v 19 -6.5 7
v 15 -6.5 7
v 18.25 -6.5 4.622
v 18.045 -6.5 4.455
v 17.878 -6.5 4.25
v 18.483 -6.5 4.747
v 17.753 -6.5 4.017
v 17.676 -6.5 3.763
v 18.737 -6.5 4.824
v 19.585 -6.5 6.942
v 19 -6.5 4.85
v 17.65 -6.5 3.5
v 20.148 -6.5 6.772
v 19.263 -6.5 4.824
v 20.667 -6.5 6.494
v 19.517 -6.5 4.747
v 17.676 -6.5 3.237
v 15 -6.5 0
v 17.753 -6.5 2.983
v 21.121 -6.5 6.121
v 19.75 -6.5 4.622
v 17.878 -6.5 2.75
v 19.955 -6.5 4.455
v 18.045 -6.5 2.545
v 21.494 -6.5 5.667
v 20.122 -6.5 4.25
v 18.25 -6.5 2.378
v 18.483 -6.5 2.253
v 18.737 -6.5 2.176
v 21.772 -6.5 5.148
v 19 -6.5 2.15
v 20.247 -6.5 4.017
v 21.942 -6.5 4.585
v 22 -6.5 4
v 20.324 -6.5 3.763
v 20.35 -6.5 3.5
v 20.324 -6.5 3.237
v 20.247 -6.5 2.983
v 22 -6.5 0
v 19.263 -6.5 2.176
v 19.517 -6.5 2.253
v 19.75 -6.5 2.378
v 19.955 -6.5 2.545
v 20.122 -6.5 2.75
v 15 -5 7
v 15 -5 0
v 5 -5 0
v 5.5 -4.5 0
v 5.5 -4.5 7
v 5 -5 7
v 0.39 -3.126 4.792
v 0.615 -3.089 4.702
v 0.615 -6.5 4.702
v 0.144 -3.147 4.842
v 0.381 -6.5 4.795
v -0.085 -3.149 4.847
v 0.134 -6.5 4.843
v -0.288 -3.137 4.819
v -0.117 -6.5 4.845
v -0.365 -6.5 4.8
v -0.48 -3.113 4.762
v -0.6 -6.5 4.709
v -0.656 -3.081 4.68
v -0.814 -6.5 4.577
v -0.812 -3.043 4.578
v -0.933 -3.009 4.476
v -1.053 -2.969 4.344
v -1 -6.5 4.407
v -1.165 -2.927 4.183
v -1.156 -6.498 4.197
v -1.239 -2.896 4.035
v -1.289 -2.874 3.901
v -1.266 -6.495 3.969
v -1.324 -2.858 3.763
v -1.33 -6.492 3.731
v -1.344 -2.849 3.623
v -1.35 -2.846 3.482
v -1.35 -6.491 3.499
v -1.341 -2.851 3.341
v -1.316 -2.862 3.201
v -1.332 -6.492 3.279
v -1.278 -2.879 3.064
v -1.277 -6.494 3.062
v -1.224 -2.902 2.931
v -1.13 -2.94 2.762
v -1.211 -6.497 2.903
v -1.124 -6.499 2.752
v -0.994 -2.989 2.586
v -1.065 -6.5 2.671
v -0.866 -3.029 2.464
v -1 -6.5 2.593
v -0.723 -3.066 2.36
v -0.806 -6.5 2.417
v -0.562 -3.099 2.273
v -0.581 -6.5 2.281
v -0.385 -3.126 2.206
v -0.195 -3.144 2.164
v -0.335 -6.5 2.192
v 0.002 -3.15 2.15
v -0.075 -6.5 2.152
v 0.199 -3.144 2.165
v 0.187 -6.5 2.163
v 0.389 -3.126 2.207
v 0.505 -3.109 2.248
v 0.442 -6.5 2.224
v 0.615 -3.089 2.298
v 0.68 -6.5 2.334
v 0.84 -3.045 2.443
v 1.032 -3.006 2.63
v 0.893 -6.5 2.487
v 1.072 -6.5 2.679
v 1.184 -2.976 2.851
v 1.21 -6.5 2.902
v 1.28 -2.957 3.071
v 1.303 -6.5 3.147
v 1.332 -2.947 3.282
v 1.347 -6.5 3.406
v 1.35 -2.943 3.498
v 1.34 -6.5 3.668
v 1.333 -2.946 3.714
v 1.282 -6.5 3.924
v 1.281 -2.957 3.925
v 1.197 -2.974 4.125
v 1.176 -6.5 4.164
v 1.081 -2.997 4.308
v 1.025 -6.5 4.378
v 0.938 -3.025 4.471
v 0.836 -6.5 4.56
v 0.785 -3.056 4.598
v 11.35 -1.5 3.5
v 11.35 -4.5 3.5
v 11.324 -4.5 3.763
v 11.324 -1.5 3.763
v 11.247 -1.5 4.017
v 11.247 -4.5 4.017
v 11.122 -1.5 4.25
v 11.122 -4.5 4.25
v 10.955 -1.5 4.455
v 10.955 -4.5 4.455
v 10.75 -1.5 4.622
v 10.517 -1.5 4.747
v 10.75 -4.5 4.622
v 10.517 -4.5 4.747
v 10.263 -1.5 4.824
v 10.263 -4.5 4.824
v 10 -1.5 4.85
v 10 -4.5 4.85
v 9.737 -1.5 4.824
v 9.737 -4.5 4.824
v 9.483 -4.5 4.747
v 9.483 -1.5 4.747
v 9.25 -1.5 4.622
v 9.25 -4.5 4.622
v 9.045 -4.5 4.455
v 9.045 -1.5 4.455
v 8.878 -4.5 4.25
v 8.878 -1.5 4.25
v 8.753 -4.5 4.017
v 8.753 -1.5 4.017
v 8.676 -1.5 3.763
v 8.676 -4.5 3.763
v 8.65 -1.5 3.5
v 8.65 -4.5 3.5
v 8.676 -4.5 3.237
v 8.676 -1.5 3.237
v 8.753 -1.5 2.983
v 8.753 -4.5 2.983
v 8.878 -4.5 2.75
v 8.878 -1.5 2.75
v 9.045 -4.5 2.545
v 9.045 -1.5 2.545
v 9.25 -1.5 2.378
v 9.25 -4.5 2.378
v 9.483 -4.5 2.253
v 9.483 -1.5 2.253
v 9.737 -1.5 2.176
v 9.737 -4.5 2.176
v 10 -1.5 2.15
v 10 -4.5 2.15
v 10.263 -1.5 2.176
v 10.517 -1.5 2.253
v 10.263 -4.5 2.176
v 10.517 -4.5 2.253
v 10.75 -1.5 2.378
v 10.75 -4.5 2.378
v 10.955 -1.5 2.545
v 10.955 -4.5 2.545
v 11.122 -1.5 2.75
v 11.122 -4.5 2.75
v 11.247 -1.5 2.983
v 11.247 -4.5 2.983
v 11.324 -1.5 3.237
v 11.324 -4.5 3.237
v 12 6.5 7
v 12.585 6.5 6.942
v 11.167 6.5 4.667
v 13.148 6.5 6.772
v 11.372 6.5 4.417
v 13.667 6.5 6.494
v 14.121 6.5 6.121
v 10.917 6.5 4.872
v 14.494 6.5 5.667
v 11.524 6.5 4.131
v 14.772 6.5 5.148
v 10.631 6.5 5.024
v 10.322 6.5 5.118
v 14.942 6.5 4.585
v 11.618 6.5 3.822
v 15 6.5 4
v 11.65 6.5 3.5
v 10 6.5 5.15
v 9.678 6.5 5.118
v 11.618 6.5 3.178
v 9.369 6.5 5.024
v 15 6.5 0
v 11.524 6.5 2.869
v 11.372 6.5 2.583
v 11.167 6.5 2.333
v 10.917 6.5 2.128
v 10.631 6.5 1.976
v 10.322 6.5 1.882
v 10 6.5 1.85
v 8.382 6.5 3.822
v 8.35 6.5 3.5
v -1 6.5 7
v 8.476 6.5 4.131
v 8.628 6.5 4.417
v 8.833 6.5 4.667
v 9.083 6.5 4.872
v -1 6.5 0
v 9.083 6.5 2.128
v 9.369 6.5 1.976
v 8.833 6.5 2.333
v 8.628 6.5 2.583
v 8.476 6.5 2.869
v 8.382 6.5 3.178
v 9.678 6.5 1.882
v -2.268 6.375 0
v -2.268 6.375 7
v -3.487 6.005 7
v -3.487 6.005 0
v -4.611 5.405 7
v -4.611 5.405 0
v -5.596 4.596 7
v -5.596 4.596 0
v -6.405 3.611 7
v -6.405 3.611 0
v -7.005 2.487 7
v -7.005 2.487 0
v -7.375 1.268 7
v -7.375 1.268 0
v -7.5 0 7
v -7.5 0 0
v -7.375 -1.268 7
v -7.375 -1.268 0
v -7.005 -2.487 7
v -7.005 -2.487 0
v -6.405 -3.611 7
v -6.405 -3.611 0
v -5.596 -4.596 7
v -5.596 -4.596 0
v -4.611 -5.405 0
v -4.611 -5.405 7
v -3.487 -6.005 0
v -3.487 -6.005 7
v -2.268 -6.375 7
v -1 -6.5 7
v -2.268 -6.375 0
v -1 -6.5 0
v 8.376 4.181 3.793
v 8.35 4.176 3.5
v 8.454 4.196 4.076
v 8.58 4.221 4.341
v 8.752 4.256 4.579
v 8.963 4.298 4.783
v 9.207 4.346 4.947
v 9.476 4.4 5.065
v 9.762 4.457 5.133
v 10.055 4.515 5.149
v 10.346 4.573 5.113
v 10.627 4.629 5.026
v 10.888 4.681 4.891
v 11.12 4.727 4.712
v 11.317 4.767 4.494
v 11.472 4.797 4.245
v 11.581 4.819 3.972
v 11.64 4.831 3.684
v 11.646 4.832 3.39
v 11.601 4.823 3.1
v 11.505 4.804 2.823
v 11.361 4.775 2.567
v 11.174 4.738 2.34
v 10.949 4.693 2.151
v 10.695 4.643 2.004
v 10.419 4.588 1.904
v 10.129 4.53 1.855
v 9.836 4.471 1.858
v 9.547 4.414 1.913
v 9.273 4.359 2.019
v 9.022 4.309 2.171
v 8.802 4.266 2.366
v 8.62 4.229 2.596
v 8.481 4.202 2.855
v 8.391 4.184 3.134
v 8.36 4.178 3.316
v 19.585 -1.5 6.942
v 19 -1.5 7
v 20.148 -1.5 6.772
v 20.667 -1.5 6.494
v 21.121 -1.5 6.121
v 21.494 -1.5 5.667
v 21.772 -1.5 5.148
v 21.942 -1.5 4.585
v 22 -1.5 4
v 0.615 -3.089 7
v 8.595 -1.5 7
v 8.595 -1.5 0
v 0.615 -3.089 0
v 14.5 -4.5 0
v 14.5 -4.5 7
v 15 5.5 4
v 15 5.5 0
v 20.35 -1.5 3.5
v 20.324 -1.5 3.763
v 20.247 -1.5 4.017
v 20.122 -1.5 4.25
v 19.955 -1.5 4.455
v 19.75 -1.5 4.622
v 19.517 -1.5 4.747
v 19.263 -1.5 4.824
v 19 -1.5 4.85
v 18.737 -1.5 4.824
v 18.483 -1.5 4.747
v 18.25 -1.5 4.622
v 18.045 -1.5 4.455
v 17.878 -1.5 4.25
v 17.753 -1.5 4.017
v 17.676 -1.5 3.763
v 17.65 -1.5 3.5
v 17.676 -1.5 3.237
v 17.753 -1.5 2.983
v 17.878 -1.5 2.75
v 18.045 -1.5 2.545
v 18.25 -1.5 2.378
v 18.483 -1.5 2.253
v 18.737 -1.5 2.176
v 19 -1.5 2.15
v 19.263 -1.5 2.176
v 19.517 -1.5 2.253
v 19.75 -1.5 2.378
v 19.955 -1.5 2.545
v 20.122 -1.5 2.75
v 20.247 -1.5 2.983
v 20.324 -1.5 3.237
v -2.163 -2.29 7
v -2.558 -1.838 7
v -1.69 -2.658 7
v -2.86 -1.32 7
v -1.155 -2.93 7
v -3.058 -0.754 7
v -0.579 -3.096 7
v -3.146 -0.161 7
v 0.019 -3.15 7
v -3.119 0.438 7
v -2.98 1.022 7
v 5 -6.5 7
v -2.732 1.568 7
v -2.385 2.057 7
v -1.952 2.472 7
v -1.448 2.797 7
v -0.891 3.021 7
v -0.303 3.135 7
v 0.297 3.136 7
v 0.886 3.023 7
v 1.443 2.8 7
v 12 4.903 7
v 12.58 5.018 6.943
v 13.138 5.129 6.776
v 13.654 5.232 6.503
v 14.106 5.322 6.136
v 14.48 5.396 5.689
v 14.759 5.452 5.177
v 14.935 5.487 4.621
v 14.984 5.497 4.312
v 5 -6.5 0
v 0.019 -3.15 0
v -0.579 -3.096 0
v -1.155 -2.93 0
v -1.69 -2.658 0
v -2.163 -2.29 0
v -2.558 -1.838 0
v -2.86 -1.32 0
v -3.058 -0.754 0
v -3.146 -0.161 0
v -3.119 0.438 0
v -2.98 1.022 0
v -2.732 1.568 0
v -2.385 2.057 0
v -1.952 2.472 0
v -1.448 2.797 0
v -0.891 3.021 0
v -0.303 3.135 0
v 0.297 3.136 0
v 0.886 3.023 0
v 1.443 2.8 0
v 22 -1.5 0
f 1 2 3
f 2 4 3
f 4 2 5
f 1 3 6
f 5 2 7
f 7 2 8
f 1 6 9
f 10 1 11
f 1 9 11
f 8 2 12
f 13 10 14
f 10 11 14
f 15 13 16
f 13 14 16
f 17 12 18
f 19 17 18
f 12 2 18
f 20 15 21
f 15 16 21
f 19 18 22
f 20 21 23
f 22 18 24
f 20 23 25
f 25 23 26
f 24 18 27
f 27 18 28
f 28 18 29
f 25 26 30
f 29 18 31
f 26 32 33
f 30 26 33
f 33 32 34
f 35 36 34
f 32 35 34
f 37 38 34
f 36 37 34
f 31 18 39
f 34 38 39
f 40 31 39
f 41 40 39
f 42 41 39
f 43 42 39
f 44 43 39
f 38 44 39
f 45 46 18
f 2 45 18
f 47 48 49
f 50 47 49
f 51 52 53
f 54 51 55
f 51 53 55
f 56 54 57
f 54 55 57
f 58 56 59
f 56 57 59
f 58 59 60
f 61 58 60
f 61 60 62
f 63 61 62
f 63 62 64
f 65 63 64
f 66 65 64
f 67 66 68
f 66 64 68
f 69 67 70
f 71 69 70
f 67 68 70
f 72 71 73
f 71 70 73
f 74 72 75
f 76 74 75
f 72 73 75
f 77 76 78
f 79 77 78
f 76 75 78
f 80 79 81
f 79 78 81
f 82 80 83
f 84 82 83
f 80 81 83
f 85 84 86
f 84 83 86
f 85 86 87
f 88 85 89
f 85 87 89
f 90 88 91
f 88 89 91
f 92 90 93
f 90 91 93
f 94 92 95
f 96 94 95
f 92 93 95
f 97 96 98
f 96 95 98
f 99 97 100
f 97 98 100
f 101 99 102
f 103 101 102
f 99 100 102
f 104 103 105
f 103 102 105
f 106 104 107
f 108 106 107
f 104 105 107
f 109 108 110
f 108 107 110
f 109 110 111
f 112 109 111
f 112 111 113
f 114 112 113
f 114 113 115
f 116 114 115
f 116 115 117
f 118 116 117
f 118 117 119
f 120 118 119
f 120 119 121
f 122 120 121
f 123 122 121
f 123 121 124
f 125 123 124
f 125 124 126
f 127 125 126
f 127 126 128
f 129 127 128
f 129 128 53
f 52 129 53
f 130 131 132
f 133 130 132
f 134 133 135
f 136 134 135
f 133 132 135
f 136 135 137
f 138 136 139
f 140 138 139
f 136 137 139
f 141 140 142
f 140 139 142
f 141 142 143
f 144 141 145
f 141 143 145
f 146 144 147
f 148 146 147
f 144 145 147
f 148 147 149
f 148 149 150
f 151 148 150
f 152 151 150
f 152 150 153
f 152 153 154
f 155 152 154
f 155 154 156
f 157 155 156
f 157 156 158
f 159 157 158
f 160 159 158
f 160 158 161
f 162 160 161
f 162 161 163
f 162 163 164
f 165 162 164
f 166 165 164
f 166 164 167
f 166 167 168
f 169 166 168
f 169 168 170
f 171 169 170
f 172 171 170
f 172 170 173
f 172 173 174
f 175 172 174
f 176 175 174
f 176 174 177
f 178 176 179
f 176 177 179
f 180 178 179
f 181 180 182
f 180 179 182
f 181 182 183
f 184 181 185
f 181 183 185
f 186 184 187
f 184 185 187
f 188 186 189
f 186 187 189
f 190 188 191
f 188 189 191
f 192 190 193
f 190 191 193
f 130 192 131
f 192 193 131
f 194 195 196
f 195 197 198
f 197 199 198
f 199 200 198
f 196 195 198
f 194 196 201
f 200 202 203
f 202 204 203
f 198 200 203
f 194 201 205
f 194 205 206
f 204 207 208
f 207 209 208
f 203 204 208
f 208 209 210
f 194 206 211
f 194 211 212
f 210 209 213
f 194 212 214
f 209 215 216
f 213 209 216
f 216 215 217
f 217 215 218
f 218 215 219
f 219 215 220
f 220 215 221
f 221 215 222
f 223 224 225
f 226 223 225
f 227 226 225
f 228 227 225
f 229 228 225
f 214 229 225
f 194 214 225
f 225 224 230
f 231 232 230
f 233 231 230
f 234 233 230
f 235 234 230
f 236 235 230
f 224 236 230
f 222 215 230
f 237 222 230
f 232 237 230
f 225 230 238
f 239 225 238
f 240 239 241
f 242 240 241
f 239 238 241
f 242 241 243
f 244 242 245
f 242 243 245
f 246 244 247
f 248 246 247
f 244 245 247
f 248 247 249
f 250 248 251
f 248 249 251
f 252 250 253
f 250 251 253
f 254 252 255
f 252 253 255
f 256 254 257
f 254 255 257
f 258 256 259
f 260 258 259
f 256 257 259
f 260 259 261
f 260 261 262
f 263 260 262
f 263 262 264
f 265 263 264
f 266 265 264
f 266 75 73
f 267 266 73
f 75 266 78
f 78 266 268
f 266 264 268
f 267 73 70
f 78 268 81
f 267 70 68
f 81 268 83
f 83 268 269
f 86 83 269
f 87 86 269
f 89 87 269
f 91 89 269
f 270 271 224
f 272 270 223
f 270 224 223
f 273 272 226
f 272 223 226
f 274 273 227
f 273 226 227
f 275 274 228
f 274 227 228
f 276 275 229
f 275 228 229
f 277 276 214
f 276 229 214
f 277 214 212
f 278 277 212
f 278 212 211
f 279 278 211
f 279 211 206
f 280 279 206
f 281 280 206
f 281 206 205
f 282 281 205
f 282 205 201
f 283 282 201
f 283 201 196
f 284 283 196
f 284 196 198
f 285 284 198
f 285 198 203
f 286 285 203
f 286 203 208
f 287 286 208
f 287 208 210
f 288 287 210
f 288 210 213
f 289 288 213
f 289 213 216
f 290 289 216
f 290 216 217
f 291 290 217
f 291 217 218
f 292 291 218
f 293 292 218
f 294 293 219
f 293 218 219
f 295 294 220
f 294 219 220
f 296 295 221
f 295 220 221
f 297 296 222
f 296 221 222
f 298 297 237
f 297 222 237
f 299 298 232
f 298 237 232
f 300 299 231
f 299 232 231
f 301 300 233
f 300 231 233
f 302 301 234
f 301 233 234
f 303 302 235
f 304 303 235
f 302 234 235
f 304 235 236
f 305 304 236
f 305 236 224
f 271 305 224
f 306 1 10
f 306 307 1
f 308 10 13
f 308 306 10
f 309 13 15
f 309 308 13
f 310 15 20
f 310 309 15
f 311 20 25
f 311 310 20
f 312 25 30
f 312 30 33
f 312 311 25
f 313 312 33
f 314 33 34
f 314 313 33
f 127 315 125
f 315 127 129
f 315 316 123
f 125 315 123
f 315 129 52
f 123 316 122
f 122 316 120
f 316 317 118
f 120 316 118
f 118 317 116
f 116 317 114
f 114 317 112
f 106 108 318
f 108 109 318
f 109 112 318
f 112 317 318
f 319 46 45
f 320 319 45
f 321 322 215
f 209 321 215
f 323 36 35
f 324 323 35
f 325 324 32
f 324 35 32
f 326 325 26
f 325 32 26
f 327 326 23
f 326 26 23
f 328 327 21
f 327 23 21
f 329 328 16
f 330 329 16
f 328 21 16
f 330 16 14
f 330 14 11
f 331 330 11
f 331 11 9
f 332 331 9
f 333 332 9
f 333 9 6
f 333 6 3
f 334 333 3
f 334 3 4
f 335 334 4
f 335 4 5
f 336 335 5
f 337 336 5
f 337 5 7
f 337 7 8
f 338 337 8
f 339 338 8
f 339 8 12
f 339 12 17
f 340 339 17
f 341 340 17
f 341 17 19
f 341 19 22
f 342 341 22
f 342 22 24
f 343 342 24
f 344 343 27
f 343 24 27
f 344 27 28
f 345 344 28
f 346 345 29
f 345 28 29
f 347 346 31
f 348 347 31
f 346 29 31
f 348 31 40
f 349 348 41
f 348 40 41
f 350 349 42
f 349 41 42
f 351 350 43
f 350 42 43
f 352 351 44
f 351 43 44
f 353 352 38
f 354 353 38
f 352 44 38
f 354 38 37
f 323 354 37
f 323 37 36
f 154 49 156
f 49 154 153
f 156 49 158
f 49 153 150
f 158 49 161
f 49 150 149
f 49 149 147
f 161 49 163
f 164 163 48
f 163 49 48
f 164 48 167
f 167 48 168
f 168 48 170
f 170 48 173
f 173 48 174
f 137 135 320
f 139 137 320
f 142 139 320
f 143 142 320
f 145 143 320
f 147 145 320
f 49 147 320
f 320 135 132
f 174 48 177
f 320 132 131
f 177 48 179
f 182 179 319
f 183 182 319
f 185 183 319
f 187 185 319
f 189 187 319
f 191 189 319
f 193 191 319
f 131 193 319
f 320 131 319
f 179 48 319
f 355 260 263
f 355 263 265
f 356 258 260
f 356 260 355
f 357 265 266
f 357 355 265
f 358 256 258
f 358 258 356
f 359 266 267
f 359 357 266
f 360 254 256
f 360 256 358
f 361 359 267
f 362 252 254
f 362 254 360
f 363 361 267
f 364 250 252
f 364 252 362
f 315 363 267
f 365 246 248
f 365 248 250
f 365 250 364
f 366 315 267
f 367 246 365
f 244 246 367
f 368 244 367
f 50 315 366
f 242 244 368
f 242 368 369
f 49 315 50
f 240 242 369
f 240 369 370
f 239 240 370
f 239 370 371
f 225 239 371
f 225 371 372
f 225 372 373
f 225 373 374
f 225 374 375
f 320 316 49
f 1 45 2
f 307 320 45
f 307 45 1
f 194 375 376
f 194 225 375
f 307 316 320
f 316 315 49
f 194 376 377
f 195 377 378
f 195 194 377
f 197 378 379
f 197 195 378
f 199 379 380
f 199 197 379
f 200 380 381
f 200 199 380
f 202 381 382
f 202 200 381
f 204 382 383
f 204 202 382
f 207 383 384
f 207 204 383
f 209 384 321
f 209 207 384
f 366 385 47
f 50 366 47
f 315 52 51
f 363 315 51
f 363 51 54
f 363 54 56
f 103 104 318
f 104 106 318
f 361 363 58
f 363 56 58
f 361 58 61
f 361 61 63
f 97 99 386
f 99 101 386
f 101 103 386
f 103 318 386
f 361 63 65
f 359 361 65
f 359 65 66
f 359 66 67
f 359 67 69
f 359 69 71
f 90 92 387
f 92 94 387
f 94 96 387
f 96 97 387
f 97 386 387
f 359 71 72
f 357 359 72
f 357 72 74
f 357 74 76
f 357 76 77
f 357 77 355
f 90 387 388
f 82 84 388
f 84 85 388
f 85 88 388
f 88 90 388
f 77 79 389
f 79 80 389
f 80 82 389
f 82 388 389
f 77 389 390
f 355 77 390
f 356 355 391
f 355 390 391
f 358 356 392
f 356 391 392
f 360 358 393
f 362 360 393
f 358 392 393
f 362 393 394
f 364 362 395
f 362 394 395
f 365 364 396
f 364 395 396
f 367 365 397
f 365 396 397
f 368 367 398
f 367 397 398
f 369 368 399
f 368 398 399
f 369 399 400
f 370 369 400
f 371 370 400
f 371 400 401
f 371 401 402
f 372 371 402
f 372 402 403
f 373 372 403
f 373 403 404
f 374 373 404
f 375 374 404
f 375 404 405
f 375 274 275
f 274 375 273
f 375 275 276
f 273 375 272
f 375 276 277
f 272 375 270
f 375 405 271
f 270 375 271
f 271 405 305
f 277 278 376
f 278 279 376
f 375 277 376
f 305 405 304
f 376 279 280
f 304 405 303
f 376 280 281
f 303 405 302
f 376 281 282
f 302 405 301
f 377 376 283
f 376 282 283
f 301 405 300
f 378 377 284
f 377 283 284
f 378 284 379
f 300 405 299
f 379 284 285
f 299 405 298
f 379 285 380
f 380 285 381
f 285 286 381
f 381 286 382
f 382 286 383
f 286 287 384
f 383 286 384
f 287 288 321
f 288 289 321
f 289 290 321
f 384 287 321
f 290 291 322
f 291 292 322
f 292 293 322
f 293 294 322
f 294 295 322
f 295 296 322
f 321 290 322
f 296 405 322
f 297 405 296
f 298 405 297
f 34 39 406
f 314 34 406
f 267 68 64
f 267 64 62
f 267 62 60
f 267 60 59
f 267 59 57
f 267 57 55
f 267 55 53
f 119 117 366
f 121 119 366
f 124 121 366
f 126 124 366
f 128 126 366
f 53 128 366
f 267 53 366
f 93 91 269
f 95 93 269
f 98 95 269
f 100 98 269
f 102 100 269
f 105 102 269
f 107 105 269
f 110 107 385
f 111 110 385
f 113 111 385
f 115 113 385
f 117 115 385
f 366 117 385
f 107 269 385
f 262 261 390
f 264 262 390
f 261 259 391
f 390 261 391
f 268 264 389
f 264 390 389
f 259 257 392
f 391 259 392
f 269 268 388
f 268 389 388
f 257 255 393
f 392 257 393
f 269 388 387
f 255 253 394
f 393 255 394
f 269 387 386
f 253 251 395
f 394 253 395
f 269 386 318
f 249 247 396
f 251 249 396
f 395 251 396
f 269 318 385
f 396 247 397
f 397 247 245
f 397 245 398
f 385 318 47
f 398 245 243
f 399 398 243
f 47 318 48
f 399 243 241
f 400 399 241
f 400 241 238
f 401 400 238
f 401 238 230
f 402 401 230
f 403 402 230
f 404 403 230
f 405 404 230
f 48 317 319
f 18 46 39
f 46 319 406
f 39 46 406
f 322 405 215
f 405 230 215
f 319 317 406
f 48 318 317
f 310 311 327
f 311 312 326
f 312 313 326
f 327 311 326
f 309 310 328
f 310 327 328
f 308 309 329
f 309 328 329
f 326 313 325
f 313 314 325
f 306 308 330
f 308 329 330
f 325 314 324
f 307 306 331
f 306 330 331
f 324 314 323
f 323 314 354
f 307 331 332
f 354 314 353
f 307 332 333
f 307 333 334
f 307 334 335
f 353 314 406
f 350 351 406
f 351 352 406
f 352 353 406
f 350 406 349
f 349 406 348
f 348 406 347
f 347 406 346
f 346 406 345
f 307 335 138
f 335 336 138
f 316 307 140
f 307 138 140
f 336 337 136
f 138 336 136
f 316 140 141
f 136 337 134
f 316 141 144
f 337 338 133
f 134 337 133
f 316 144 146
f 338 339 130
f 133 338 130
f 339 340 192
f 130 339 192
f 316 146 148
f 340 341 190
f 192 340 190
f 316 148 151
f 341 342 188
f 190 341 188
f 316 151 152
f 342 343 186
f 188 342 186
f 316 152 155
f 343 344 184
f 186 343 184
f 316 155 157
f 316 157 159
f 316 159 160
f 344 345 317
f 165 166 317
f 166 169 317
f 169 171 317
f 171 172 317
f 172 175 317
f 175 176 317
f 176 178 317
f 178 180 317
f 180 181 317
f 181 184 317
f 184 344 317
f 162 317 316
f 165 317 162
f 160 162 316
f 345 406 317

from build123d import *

# Parameters (mm, degrees)
BOSS_EXTRUDE1_DEPTH = 7
CUT_EXTRUDE1_REACH  = 28.495
SKETCH2_R           = 1.35
CUT_EXTRUDE2_REACH  = 28.495
SKETCH3_R           = 1.65
FILLET1_R           = 3
CHAMFER2_SIZE       = 0.5


with BuildPart() as part:
    # Sketch1 → Boss-Extrude1 (new body)
    with BuildSketch(Plane.XY):
        with BuildLine():
            Line((1.443086969, 2.8), (15, 5.5))
            Line((15, 5.5), (15, 6.5))
            Line((15, 6.5), (-1, 6.5))
            ThreePointArc((-1, 6.5), (-7.5, 0), (-1, -6.5))
            Line((-1, -6.5), (5, -6.5))
            Line((5, -6.5), (5, -4.5))
            Line((5, -4.5), (15, -4.5))
            Line((15, -4.5), (15, -6.5))
            Line((15, -6.5), (22, -6.5))
            Line((22, -6.5), (22, -1.5))
            Line((22, -1.5), (8.595407496, -1.5))
            Line((8.595407496, -1.5), (0.615271538, -3.089326939))
            ThreePointArc((0.615271538, -3.089326939), (-3.119335327, 0.438459937), (1.443086969, 2.8))
        make_face()
    extrude(amount=BOSS_EXTRUDE1_DEPTH)

    # Sketch2 → Cut-Extrude1 (cut, up to next)
    with BuildSketch(Plane.XZ.offset(6.5), mode=Mode.PRIVATE) as cut_extrude1_sk1:
        with Locations(Location((0, 3.5, 0), (0, 0, 62.886368109))):
            Circle(SKETCH2_R)
    cut_extrude1_tool1 = extrude(cut_extrude1_sk1.sketch, amount=-CUT_EXTRUDE1_REACH, mode=Mode.PRIVATE) & part.part
    # Sketch2 → Cut-Extrude1 (cut, up to next)
    with BuildSketch(Plane.XZ.offset(6.5), mode=Mode.PRIVATE) as cut_extrude1_sk2:
        with Locations((10, 3.5)):
            Circle(SKETCH2_R)
    cut_extrude1_tool2 = extrude(cut_extrude1_sk2.sketch, amount=-CUT_EXTRUDE1_REACH, mode=Mode.PRIVATE) & part.part
    # Sketch2 → Cut-Extrude1 (cut, up to next)
    with BuildSketch(Plane.XZ.offset(6.5), mode=Mode.PRIVATE) as cut_extrude1_sk3:
        with Locations((19, 3.5)):
            Circle(SKETCH2_R)
    cut_extrude1_tool3 = extrude(cut_extrude1_sk3.sketch, amount=-CUT_EXTRUDE1_REACH, mode=Mode.PRIVATE) & part.part
    add(cut_extrude1_tool1.solids().sort_by_distance((0, -6.5, 3.5))[0], mode=Mode.SUBTRACT)
    add(cut_extrude1_tool2.solids().sort_by_distance((10, -6.5, 3.5))[0], mode=Mode.SUBTRACT)
    add(cut_extrude1_tool3.solids().sort_by_distance((19, -6.5, 3.5))[0], mode=Mode.SUBTRACT)

    # Cut-Extrude2: up to this plane
    cut_extrude2_end = Plane(origin=(1.443086969, 2.8, 7), z_dir=(-0.19532429785675304, 0.9807387107006466, 0))
    # Sketch3 → Cut-Extrude2 (cut, up to the surface)
    with BuildSketch(Plane(origin=(0, 6.5, 0), x_dir=(1, 0, 0), z_dir=(0, 1, 0)), mode=Mode.PRIVATE) as cut_extrude2_sk1:
        with Locations(Location((10, -3.5, 0), (0, 0, 180))):
            Circle(SKETCH3_R)
    cut_extrude2_tool1 = split(extrude(cut_extrude2_sk1.sketch, amount=-CUT_EXTRUDE2_REACH, mode=Mode.PRIVATE), bisect_by=cut_extrude2_end, keep=Keep.BOTH, mode=Mode.PRIVATE)
    add(cut_extrude2_tool1.solids().sort_by_distance((10, 6.5, 3.5))[0], mode=Mode.SUBTRACT)

    # Fillet1
    fillet1_edges = [part.edges().sort_by_distance(p)[0] for p in [
        (15, 6, 7),
        (22, -4, 7),
    ]]
    fillet(fillet1_edges, radius=FILLET1_R)

    # Chamfer2
    chamfer2_edges = [part.edges().sort_by_distance(p)[0] for p in [
        (15, -4.5, 3.5),
        (5, -4.5, 3.5),
    ]]
    chamfer(chamfer2_edges, length=CHAMFER2_SIZE)


solid = part.part
